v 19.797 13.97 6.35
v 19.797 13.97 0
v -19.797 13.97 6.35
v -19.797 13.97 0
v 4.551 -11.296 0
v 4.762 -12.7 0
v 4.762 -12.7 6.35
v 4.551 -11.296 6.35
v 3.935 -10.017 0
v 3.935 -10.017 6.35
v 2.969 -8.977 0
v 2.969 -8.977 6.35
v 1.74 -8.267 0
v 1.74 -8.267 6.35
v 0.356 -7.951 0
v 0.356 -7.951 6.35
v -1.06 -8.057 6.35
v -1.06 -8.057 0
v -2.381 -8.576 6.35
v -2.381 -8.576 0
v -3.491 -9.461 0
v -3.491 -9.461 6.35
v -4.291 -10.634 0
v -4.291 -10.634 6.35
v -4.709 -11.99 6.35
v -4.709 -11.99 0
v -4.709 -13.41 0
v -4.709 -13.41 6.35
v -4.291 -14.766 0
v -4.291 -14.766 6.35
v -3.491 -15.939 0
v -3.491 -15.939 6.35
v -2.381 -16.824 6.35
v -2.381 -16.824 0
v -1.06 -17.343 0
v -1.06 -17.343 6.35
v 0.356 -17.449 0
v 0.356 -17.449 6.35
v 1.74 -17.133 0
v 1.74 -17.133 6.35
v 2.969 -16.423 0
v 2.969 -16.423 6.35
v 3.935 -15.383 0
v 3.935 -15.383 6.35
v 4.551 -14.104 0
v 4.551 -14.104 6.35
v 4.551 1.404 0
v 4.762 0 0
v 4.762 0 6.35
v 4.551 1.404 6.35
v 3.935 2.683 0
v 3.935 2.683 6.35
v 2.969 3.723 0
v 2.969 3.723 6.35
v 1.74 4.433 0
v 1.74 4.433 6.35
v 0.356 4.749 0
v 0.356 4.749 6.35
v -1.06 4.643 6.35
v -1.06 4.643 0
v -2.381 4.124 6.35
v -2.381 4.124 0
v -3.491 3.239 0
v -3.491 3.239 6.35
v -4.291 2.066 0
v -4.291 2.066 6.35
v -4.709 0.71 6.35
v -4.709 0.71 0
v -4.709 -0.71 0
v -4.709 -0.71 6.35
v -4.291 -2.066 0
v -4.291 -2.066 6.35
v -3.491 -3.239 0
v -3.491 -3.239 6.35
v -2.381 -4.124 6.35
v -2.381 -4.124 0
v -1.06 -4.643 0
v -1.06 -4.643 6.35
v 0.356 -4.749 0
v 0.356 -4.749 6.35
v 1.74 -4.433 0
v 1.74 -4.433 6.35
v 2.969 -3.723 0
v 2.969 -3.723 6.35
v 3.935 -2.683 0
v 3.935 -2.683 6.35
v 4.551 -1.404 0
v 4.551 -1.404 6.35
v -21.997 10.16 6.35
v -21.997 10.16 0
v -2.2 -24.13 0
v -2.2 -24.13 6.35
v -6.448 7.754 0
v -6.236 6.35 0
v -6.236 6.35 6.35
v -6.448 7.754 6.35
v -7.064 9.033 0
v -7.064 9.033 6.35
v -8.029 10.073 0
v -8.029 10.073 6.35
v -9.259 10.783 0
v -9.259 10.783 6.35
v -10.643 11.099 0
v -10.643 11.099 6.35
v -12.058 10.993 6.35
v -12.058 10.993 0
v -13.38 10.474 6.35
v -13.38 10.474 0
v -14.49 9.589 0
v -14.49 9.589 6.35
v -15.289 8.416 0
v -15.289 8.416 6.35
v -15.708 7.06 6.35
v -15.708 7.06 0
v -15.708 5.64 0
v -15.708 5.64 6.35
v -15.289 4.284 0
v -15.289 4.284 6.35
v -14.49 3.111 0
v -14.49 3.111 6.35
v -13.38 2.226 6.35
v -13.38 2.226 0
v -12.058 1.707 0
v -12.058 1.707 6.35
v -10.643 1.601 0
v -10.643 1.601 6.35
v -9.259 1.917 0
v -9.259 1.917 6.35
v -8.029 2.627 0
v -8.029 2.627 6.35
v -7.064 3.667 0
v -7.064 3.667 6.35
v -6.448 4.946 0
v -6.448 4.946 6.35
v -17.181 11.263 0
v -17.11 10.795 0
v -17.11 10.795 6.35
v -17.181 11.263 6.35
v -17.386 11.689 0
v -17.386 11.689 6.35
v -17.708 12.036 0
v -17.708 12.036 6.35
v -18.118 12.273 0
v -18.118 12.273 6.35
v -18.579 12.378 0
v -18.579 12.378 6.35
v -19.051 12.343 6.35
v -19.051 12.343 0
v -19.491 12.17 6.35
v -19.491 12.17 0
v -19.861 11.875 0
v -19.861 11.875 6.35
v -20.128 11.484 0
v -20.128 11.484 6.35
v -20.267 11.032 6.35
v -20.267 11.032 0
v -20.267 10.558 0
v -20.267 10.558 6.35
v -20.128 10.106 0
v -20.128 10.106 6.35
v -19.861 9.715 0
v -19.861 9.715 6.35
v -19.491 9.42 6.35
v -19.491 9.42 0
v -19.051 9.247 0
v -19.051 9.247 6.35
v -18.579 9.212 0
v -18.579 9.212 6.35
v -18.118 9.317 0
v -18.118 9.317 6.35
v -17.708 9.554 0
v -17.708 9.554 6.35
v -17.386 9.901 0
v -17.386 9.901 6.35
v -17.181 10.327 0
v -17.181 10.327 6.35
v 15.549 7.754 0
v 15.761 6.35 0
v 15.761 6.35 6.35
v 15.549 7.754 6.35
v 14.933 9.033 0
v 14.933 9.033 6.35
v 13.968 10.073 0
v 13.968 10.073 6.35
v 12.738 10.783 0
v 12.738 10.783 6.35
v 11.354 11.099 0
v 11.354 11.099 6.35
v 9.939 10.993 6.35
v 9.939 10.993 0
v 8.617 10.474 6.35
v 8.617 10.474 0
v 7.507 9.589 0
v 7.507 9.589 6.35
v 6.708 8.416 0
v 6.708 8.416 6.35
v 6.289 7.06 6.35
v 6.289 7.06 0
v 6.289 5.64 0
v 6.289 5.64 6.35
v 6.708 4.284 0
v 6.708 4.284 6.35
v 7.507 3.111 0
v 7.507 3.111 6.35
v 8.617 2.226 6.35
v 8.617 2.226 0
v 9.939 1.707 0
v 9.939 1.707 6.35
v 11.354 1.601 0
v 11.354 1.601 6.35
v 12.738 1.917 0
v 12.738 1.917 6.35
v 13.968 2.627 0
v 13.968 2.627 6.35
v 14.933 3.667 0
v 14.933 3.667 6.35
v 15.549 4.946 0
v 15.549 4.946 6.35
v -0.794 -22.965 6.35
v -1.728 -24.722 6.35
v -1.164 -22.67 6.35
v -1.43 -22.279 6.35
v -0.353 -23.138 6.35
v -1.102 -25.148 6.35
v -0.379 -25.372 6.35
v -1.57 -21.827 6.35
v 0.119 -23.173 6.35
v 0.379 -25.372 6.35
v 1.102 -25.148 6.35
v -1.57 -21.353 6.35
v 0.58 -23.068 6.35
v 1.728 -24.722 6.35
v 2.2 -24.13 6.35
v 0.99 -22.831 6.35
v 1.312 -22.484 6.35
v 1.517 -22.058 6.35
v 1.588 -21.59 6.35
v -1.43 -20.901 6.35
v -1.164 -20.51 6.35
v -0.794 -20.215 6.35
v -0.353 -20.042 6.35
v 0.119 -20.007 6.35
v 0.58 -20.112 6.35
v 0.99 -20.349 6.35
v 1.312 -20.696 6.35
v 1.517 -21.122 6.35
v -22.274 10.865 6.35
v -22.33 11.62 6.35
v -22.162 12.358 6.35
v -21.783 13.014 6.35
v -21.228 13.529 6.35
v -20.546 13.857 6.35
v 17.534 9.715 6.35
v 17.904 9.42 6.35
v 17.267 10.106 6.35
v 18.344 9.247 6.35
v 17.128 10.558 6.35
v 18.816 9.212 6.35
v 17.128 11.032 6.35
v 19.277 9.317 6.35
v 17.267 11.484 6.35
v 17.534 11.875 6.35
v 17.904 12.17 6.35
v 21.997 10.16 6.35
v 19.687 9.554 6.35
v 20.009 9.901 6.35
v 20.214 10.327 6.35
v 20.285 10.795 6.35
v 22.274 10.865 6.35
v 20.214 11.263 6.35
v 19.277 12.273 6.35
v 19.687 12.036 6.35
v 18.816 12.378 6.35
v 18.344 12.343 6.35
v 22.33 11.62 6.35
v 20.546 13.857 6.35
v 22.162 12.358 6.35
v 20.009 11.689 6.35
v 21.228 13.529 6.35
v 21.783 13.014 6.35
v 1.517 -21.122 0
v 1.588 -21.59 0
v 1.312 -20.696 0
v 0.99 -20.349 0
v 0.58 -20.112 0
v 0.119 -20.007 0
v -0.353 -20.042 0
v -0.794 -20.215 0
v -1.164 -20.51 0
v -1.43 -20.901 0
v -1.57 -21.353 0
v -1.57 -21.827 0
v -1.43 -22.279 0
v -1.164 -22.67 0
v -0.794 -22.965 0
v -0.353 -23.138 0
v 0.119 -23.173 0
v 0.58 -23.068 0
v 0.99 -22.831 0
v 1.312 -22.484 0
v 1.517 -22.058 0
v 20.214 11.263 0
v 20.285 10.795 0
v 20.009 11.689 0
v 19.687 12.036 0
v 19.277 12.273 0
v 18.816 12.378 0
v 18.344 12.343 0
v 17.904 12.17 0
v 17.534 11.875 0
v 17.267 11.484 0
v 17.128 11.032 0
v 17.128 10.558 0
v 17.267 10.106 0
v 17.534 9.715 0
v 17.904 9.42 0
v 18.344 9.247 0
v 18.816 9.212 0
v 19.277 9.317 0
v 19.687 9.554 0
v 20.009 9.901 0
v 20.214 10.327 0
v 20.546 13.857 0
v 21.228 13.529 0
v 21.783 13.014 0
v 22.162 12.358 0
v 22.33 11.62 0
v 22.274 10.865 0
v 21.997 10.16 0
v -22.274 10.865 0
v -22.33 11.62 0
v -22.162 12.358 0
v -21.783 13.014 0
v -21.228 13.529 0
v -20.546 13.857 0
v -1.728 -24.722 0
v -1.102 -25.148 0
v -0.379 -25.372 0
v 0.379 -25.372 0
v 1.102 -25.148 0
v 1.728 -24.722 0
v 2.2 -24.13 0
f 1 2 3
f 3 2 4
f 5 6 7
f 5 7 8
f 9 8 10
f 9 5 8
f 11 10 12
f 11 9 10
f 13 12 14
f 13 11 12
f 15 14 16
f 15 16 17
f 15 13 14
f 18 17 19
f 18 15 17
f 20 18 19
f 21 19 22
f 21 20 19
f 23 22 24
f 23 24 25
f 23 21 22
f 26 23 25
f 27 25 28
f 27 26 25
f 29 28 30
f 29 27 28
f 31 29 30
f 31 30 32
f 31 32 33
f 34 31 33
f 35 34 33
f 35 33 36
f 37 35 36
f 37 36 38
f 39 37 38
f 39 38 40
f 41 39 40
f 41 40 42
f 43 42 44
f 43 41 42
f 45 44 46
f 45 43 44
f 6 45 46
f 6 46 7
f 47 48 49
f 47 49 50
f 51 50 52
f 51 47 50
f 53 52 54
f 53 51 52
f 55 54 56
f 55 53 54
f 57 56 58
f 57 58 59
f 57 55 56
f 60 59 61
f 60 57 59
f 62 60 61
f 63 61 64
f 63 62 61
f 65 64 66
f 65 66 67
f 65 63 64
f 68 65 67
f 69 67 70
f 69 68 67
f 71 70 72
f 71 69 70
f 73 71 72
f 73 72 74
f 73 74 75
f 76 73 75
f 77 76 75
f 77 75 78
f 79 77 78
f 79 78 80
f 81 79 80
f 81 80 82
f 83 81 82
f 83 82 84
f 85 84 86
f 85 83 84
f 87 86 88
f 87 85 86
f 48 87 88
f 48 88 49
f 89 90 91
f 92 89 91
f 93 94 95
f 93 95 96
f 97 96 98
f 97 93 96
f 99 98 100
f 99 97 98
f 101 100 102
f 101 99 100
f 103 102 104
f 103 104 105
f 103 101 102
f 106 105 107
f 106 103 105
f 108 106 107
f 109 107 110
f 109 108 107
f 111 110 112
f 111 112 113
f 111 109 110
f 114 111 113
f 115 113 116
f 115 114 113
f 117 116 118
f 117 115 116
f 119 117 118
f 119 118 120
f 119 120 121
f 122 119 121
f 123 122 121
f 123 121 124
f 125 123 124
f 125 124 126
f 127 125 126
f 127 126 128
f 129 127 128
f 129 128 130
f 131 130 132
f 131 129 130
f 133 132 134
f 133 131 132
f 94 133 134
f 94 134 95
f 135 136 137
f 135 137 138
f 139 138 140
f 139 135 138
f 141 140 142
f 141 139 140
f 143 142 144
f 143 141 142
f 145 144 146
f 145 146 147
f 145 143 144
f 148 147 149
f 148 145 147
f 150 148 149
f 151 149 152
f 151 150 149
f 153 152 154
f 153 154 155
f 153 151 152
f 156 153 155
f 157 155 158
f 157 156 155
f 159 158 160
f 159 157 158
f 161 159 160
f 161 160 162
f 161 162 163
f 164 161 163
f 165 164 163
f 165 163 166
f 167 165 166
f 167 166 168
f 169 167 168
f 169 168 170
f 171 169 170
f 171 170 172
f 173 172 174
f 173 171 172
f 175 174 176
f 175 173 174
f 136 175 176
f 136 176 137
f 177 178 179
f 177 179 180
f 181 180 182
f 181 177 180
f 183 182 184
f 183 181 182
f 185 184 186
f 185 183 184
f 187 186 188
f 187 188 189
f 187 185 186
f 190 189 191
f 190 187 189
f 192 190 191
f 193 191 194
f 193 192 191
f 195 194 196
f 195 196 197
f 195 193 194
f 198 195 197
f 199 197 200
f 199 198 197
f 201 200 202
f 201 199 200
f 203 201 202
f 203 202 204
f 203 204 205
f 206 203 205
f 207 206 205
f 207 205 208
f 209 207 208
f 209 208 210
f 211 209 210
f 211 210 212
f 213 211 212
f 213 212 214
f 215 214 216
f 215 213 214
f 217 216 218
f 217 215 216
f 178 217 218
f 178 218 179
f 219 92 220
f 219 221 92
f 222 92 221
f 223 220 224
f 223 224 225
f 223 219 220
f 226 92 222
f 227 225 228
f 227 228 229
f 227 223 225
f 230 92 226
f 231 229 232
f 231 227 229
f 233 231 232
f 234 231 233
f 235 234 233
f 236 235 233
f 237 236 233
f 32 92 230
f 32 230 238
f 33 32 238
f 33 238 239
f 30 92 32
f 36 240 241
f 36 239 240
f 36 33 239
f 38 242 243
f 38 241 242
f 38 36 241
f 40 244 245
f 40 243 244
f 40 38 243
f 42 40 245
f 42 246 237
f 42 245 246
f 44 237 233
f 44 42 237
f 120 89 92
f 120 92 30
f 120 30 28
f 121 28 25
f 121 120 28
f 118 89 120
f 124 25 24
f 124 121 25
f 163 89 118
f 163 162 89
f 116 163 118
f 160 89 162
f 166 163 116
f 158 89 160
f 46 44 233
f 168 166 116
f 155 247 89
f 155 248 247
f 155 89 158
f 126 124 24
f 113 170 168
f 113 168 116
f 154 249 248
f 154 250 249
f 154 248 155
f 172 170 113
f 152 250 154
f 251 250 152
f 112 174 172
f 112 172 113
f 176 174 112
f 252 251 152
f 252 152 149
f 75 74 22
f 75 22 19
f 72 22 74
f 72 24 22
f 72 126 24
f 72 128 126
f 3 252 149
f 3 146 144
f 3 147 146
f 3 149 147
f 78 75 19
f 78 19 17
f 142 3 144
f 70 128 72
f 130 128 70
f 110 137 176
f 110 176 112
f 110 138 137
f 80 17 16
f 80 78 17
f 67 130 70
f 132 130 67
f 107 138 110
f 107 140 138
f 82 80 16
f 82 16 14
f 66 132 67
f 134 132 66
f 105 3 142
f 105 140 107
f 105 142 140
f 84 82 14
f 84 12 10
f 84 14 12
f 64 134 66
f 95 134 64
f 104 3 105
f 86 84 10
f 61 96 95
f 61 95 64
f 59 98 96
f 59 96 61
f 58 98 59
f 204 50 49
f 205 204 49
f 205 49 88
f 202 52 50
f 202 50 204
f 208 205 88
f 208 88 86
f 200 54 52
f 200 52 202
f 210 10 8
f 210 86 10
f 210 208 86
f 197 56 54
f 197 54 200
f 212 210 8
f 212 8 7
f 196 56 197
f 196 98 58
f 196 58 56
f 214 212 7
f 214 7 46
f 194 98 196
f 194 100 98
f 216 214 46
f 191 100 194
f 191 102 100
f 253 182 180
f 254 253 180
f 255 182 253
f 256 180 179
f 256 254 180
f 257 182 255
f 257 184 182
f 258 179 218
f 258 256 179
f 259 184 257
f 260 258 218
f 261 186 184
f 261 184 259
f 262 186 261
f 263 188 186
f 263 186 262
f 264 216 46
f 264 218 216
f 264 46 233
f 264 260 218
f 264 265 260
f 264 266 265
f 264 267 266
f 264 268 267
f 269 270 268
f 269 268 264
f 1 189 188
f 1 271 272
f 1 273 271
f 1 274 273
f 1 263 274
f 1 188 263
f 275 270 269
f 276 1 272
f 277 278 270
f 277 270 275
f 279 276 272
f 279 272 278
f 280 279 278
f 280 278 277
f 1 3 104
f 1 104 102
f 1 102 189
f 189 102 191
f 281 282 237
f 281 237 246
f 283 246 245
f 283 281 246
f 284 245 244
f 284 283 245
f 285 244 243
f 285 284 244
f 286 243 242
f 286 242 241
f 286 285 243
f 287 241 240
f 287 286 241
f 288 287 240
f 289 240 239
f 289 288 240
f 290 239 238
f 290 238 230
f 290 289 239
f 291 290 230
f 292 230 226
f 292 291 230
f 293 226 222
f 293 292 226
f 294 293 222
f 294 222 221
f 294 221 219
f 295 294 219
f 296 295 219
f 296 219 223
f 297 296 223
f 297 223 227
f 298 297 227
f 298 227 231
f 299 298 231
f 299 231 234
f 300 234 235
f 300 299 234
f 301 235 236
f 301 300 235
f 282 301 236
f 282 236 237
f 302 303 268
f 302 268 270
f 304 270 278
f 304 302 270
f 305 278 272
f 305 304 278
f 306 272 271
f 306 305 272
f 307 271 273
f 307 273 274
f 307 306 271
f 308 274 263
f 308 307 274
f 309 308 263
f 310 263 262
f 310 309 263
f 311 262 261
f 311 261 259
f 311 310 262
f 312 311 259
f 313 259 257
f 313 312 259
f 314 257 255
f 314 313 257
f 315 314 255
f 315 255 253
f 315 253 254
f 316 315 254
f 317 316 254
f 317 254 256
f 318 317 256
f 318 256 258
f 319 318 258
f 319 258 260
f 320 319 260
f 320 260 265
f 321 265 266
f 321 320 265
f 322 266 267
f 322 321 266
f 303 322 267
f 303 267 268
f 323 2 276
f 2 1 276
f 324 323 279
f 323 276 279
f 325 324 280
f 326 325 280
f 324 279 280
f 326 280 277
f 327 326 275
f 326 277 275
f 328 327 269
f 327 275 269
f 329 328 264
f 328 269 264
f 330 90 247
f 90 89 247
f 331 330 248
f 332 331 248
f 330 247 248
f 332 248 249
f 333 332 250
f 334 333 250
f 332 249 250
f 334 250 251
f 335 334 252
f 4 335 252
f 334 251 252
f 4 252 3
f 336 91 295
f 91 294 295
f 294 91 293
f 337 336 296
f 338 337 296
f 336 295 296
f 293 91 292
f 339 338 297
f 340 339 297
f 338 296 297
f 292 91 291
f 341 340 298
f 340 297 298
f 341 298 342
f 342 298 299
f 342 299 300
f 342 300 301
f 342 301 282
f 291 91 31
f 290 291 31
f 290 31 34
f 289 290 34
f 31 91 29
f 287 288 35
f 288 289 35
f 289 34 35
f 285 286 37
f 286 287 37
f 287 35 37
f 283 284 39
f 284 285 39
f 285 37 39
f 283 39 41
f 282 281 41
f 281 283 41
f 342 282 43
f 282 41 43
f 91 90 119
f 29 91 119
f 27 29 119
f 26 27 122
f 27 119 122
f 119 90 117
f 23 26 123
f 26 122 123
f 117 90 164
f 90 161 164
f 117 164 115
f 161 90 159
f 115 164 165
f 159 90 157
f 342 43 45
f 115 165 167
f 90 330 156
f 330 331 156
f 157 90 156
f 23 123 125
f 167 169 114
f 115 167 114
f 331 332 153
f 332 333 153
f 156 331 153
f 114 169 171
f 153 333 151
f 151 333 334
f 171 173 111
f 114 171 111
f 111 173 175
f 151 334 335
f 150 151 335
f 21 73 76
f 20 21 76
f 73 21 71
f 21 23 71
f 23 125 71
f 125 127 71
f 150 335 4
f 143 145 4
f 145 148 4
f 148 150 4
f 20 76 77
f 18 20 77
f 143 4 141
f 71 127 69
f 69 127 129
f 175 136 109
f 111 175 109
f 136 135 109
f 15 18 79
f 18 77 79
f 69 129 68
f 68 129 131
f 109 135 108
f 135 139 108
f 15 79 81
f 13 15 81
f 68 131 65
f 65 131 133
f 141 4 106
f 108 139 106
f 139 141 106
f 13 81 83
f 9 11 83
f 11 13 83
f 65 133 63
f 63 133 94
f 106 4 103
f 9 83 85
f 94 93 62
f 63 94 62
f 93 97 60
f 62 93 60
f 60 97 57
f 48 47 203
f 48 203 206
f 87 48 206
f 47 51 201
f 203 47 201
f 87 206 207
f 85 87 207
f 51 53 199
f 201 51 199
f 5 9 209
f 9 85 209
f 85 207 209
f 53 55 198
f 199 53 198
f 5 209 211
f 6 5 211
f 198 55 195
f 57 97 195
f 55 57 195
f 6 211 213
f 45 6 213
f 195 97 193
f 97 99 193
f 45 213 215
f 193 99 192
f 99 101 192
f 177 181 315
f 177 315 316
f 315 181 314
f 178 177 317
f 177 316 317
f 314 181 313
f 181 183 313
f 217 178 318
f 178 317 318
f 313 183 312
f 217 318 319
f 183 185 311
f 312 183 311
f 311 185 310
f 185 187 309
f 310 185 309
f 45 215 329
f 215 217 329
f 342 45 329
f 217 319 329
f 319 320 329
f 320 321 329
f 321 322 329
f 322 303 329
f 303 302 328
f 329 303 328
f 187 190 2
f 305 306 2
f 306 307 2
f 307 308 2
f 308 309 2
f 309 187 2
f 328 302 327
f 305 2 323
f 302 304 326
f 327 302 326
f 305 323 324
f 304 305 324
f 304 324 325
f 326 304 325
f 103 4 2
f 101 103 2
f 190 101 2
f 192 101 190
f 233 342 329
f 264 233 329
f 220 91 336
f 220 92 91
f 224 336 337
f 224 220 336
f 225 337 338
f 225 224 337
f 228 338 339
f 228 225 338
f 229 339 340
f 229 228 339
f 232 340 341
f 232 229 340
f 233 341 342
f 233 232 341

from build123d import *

# Parameters (mm, degrees)
F0_R     = 1.5875
F0_R_2   = 4.7625
F1_DEPTH = 6.35
F2_R     = 2.54


# Not quite as in the source:
# - a length typed as a fraction of an inch, garbled in the dataset ("3 / 203.2 mm" for 3/8 in), is restored


with BuildPart() as f1:
    # F0 (on Top) → F1 (new body)
    with BuildSketch(Plane.XY):
        Polygon((-24.1967497817, 13.97), (0, -27.94), (24.1967497817, 13.97), align=None)
        with Locations((0, -21.59)):
            Circle(F0_R, mode=Mode.SUBTRACT)
        with Locations((0, -12.7)):
            Circle(F0_R_2, mode=Mode.SUBTRACT)
        Circle(F0_R_2, mode=Mode.SUBTRACT)
        with Locations((-18.6974884677, 10.795)):
            Circle(F0_R, mode=Mode.SUBTRACT)
        with Locations((-10.9985226281, 6.35)):
            Circle(F0_R_2, mode=Mode.SUBTRACT)
        with Locations((10.9985226281, 6.35)):
            Circle(F0_R_2, mode=Mode.SUBTRACT)
        with Locations((18.6974884677, 10.795)):
            Circle(F0_R, mode=Mode.SUBTRACT)
    extrude(amount=F1_DEPTH)

    # F2
    f2_edges = [f1.edges().sort_by_distance(p)[0] for p in [
        (-24.19675, 13.97, 3.175),
        (0, -27.94, 3.175),
        (24.19675, 13.97, 3.175),
    ]]
    fillet(f2_edges, radius=F2_R)


solid = f1.part
